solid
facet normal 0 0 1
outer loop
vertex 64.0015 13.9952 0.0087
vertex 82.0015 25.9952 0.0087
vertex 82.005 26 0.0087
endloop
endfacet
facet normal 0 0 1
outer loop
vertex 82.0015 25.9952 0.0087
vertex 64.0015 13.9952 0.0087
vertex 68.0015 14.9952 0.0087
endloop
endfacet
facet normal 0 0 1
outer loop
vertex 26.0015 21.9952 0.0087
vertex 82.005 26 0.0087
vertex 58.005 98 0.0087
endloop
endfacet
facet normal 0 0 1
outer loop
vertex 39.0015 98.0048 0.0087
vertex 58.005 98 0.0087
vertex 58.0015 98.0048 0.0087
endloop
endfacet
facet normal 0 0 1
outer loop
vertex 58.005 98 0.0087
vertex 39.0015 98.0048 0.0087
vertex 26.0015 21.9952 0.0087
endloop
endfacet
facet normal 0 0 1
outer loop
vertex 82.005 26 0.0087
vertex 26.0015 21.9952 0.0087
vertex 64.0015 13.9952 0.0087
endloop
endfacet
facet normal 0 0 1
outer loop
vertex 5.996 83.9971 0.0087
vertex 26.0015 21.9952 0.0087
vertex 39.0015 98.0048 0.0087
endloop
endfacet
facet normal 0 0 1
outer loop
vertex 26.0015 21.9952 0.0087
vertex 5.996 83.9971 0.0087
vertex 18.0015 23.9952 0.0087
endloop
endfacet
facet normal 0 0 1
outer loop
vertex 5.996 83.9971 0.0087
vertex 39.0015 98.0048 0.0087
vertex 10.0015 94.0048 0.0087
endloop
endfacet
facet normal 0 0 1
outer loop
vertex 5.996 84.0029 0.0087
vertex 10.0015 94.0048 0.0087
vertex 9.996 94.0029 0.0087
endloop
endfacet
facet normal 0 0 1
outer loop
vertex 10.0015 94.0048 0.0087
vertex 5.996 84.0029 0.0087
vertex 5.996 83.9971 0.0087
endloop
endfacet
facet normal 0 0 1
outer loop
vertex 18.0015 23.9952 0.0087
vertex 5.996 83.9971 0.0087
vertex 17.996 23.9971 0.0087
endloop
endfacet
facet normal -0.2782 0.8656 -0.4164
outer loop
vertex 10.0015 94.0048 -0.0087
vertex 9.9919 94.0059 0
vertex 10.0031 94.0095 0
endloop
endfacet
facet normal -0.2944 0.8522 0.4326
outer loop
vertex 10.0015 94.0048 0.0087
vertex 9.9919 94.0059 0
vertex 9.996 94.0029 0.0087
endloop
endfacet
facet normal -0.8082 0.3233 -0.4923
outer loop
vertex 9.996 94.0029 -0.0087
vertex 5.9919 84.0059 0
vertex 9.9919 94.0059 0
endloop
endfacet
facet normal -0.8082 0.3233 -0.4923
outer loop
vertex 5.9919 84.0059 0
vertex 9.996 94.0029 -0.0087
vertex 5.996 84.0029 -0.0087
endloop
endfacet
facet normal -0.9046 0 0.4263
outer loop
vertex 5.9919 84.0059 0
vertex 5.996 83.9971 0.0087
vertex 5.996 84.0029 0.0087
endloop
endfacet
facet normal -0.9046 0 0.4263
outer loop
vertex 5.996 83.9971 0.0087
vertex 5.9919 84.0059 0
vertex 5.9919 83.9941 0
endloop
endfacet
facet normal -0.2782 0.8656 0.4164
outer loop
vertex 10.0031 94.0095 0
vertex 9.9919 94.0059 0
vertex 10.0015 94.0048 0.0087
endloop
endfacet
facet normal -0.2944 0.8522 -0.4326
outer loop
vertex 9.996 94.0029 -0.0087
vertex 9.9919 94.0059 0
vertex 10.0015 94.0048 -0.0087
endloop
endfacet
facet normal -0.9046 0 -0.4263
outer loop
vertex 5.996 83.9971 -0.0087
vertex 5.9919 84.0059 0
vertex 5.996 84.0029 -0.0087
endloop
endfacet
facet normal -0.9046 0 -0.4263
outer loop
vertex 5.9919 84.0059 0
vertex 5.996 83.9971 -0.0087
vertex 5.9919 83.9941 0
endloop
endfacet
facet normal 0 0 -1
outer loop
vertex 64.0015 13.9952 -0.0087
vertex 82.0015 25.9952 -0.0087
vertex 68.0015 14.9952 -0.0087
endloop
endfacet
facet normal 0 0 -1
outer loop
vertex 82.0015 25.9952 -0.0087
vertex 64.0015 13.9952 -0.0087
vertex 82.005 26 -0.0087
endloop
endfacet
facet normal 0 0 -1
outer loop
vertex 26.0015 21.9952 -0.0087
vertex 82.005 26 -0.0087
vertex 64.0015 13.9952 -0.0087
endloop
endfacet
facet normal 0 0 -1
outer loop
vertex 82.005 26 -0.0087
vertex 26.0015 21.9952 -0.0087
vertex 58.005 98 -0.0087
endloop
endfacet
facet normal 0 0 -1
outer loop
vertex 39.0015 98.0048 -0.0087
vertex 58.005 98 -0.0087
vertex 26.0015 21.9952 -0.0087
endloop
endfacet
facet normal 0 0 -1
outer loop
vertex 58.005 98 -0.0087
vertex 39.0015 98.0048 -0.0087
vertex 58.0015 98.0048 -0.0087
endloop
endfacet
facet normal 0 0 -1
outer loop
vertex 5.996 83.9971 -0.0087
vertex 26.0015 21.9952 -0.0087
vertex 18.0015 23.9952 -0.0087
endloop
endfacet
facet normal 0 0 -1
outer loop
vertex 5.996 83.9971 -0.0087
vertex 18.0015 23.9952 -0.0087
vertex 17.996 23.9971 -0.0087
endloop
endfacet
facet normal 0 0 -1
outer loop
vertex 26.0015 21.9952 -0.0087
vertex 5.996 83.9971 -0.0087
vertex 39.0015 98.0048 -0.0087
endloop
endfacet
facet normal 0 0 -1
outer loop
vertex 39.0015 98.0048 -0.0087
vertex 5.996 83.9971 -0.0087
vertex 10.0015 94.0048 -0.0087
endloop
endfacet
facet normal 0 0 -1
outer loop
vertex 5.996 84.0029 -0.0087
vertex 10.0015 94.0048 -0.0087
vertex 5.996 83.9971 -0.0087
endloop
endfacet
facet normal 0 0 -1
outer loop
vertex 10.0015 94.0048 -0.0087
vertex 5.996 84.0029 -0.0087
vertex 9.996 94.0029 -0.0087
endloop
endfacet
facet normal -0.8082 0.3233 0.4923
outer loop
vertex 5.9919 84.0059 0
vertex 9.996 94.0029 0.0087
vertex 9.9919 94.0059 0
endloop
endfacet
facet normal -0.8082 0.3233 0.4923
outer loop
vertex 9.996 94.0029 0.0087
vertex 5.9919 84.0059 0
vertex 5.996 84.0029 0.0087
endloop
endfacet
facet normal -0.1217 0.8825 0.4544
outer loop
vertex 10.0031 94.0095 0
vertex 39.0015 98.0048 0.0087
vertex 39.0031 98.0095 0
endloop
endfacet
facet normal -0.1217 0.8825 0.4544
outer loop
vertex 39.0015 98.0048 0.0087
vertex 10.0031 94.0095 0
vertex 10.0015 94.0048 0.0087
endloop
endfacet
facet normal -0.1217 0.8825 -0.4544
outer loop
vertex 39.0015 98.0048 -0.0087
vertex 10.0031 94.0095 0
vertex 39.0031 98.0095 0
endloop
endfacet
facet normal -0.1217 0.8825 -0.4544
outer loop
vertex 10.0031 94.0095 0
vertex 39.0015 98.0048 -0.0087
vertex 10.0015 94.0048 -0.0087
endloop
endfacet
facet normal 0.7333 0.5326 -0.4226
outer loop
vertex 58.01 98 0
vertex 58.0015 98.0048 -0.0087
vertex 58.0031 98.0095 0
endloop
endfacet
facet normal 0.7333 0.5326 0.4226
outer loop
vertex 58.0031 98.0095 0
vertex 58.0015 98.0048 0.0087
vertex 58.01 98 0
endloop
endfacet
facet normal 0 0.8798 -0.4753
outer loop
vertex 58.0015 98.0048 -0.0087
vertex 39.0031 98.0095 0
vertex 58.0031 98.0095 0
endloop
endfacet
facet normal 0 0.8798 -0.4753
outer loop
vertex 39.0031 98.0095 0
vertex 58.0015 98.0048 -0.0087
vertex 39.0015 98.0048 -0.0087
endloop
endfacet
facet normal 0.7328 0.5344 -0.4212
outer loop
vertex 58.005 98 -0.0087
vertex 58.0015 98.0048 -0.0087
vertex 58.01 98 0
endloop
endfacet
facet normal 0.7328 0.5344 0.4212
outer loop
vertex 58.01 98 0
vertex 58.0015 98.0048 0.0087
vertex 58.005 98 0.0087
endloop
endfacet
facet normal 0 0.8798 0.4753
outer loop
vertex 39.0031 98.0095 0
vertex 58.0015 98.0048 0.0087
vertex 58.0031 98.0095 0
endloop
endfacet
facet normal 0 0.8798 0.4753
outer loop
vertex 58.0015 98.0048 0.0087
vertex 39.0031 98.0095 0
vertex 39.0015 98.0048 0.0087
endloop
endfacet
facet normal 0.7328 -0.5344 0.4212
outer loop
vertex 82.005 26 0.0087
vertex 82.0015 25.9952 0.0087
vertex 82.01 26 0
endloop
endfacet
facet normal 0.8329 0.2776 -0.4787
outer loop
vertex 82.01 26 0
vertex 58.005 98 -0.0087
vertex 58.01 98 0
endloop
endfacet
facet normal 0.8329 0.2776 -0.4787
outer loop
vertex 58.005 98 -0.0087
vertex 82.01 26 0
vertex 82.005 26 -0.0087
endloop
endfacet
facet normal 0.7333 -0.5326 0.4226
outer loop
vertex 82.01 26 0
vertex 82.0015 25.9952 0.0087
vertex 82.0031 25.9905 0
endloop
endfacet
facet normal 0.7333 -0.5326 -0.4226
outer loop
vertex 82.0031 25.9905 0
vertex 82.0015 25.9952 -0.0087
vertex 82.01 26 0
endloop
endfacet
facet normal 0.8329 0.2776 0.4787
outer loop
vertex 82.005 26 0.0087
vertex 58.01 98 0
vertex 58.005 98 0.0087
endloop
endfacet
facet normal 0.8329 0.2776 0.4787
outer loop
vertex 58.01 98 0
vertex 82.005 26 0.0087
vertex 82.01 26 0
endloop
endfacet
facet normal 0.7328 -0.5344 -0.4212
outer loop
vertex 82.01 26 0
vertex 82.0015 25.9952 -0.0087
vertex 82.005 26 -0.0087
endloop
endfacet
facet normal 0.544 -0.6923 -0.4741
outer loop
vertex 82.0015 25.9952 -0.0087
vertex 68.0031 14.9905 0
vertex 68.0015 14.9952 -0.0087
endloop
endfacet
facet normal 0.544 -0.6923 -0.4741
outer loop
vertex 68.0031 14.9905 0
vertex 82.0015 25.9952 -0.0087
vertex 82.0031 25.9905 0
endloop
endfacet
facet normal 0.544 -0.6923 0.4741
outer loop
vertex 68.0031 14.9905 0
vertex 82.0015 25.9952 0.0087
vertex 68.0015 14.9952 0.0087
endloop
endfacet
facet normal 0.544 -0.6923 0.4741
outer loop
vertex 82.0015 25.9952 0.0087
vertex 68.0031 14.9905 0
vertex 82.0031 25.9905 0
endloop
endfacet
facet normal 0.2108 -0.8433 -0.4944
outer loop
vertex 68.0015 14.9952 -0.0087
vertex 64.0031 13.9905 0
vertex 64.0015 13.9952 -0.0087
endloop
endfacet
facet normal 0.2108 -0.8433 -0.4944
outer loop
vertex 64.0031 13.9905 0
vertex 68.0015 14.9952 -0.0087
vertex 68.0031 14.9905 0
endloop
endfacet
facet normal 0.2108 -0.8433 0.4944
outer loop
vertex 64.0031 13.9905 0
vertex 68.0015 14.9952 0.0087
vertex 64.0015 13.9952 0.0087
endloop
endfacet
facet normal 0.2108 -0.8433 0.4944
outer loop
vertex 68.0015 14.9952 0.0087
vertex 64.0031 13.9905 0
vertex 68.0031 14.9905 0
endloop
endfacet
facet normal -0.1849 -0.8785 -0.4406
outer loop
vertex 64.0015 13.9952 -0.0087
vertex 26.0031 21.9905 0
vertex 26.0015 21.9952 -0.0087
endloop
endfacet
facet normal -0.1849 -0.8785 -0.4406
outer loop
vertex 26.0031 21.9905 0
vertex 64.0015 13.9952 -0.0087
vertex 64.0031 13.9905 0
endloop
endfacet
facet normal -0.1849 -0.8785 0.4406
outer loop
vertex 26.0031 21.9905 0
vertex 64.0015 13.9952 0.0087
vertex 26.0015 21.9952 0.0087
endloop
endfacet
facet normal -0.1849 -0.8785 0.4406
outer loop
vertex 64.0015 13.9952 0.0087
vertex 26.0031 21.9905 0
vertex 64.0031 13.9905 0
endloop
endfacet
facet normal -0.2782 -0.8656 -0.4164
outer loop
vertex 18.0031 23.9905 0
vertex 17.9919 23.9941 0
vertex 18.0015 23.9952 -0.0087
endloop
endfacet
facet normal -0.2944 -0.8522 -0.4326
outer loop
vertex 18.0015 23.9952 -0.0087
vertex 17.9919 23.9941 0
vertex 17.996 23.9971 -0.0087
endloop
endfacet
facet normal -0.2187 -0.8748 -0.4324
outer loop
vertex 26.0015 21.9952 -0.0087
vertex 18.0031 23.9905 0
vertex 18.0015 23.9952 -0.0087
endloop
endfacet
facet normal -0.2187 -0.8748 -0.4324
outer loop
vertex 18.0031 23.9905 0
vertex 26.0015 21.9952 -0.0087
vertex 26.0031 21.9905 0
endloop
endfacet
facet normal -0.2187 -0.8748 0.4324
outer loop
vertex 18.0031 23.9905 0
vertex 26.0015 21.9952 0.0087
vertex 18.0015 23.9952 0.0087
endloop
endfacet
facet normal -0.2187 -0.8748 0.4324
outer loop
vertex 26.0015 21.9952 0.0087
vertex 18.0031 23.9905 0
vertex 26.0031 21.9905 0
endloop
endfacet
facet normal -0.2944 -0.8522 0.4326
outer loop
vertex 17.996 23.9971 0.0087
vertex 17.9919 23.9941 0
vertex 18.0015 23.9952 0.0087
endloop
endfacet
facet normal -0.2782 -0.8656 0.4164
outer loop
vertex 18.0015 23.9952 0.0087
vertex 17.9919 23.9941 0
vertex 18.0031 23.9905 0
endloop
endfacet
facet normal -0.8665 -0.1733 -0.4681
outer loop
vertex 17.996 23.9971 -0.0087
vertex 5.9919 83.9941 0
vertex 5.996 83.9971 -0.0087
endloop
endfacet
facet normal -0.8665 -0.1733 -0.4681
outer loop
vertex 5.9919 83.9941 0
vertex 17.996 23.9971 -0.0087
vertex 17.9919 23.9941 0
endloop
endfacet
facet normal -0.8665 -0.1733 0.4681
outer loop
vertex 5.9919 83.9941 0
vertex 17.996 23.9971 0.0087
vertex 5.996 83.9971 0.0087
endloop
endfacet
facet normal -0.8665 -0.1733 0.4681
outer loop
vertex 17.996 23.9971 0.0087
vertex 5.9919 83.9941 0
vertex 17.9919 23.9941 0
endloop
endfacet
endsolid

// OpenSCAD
color([0.3519350680925015,0.6477014615427978,0.14125726454845833]) hull(){
    translate([10,94]) sphere(0.01);
    translate([6,84]) sphere(0.01);
    translate([22,90]) sphere(0.01);
}
color([0.23013900541024712,0.8285218163248013,0.9603761550286747]) hull(){
    translate([10,94]) sphere(0.01);
    translate([22,90]) sphere(0.01);
    translate([39,98]) sphere(0.01);
}
color([0.6050710034948523,0.017553655236826726,0.43262871278032167]) hull(){
    translate([58,98]) sphere(0.01);
    translate([39,98]) sphere(0.01);
    translate([50,93]) sphere(0.01);
}
color([0.2571490251669072,0.4480229944680496,0.14517873337393172]) hull(){
    translate([22,90]) sphere(0.01);
    translate([50,93]) sphere(0.01);
    translate([39,98]) sphere(0.01);
}
color([0.8405131005933094,0.9776834869331054,0.10300019528175153]) hull(){
    translate([58,98]) sphere(0.01);
    translate([50,93]) sphere(0.01);
    translate([44,55]) sphere(0.01);
}
color([0.998153073210626,0.8535026464000083,0.6855970549077809]) hull(){
    translate([82,26]) sphere(0.01);
    translate([58,98]) sphere(0.01);
    translate([44,55]) sphere(0.01);
}
color([0.7995005100691247,0.34047238184459006,0.1286635278612125]) hull(){
    translate([82,26]) sphere(0.01);
    translate([44,55]) sphere(0.01);
    translate([58,33]) sphere(0.01);
}
color([0.6020598448119898,0.9167847797194366,0.02081986636819022]) hull(){
    translate([68,15]) sphere(0.01);
    translate([82,26]) sphere(0.01);
    translate([58,33]) sphere(0.01);
}
color([0.9135118305629362,0.3823609034395232,0.42581309278619206]) hull(){
    translate([64,14]) sphere(0.01);
    translate([68,15]) sphere(0.01);
    translate([58,33]) sphere(0.01);
}
color([0.08967296065919184,0.0016857337534631478,0.31287848776698257]) hull(){
    translate([64,14]) sphere(0.01);
    translate([58,33]) sphere(0.01);
    translate([42,29]) sphere(0.01);
}
color([0.09731792302828757,0.364404074066101,0.8754307508322564]) hull(){
    translate([26,22]) sphere(0.01);
    translate([64,14]) sphere(0.01);
    translate([42,29]) sphere(0.01);
}
color([0.6967090939923642,0.5776053806129825,0.18685318159950626]) hull(){
    translate([26,22]) sphere(0.01);
    translate([42,29]) sphere(0.01);
    translate([44,47]) sphere(0.01);
}
color([0.9585806736472646,0.593334846568766,0.09927504601217696]) hull(){
    translate([18,24]) sphere(0.01);
    translate([26,22]) sphere(0.01);
    translate([44,47]) sphere(0.01);
}
color([0.19313665173925,0.6863688301261038,0.2093263356404984]) hull(){
    translate([18,24]) sphere(0.01);
    translate([44,47]) sphere(0.01);
    translate([18,58]) sphere(0.01);
}
color([0.2694340379225941,0.24598969558588324,0.16092298384524362]) hull(){
    translate([6,84]) sphere(0.01);
    translate([18,24]) sphere(0.01);
    translate([18,58]) sphere(0.01);
}
color([0.5102606956149307,0.431705445139412,0.38909399282504675]) hull(){
    translate([6,84]) sphere(0.01);
    translate([18,58]) sphere(0.01);
    translate([22,90]) sphere(0.01);
}
color([0.3194819673674283,0.6655357355223767,0.22692357675811492]) hull(){
    translate([18,58]) sphere(0.01);
    translate([44,55]) sphere(0.01);
    translate([22,90]) sphere(0.01);
}
color([0.9464906820257937,0.35776616524050997,0.9421064453260054]) hull(){
    translate([22,90]) sphere(0.01);
    translate([44,55]) sphere(0.01);
    translate([50,93]) sphere(0.01);
}
color([0.3792404853118415,0.27508202782836655,0.9368074710650367]) hull(){
    translate([18,58]) sphere(0.01);
    translate([44,47]) sphere(0.01);
    translate([44,55]) sphere(0.01);
}
color([0.7670397757471089,0.17483880300164423,0.7474114244696689]) hull(){
    translate([44,55]) sphere(0.01);
    translate([44,47]) sphere(0.01);
    translate([58,33]) sphere(0.01);
}
color([0.6015236368594579,0.5872808850844162,0.28390336255679416]) hull(){
    translate([58,33]) sphere(0.01);
    translate([44,47]) sphere(0.01);
    translate([42,29]) sphere(0.01);
}
